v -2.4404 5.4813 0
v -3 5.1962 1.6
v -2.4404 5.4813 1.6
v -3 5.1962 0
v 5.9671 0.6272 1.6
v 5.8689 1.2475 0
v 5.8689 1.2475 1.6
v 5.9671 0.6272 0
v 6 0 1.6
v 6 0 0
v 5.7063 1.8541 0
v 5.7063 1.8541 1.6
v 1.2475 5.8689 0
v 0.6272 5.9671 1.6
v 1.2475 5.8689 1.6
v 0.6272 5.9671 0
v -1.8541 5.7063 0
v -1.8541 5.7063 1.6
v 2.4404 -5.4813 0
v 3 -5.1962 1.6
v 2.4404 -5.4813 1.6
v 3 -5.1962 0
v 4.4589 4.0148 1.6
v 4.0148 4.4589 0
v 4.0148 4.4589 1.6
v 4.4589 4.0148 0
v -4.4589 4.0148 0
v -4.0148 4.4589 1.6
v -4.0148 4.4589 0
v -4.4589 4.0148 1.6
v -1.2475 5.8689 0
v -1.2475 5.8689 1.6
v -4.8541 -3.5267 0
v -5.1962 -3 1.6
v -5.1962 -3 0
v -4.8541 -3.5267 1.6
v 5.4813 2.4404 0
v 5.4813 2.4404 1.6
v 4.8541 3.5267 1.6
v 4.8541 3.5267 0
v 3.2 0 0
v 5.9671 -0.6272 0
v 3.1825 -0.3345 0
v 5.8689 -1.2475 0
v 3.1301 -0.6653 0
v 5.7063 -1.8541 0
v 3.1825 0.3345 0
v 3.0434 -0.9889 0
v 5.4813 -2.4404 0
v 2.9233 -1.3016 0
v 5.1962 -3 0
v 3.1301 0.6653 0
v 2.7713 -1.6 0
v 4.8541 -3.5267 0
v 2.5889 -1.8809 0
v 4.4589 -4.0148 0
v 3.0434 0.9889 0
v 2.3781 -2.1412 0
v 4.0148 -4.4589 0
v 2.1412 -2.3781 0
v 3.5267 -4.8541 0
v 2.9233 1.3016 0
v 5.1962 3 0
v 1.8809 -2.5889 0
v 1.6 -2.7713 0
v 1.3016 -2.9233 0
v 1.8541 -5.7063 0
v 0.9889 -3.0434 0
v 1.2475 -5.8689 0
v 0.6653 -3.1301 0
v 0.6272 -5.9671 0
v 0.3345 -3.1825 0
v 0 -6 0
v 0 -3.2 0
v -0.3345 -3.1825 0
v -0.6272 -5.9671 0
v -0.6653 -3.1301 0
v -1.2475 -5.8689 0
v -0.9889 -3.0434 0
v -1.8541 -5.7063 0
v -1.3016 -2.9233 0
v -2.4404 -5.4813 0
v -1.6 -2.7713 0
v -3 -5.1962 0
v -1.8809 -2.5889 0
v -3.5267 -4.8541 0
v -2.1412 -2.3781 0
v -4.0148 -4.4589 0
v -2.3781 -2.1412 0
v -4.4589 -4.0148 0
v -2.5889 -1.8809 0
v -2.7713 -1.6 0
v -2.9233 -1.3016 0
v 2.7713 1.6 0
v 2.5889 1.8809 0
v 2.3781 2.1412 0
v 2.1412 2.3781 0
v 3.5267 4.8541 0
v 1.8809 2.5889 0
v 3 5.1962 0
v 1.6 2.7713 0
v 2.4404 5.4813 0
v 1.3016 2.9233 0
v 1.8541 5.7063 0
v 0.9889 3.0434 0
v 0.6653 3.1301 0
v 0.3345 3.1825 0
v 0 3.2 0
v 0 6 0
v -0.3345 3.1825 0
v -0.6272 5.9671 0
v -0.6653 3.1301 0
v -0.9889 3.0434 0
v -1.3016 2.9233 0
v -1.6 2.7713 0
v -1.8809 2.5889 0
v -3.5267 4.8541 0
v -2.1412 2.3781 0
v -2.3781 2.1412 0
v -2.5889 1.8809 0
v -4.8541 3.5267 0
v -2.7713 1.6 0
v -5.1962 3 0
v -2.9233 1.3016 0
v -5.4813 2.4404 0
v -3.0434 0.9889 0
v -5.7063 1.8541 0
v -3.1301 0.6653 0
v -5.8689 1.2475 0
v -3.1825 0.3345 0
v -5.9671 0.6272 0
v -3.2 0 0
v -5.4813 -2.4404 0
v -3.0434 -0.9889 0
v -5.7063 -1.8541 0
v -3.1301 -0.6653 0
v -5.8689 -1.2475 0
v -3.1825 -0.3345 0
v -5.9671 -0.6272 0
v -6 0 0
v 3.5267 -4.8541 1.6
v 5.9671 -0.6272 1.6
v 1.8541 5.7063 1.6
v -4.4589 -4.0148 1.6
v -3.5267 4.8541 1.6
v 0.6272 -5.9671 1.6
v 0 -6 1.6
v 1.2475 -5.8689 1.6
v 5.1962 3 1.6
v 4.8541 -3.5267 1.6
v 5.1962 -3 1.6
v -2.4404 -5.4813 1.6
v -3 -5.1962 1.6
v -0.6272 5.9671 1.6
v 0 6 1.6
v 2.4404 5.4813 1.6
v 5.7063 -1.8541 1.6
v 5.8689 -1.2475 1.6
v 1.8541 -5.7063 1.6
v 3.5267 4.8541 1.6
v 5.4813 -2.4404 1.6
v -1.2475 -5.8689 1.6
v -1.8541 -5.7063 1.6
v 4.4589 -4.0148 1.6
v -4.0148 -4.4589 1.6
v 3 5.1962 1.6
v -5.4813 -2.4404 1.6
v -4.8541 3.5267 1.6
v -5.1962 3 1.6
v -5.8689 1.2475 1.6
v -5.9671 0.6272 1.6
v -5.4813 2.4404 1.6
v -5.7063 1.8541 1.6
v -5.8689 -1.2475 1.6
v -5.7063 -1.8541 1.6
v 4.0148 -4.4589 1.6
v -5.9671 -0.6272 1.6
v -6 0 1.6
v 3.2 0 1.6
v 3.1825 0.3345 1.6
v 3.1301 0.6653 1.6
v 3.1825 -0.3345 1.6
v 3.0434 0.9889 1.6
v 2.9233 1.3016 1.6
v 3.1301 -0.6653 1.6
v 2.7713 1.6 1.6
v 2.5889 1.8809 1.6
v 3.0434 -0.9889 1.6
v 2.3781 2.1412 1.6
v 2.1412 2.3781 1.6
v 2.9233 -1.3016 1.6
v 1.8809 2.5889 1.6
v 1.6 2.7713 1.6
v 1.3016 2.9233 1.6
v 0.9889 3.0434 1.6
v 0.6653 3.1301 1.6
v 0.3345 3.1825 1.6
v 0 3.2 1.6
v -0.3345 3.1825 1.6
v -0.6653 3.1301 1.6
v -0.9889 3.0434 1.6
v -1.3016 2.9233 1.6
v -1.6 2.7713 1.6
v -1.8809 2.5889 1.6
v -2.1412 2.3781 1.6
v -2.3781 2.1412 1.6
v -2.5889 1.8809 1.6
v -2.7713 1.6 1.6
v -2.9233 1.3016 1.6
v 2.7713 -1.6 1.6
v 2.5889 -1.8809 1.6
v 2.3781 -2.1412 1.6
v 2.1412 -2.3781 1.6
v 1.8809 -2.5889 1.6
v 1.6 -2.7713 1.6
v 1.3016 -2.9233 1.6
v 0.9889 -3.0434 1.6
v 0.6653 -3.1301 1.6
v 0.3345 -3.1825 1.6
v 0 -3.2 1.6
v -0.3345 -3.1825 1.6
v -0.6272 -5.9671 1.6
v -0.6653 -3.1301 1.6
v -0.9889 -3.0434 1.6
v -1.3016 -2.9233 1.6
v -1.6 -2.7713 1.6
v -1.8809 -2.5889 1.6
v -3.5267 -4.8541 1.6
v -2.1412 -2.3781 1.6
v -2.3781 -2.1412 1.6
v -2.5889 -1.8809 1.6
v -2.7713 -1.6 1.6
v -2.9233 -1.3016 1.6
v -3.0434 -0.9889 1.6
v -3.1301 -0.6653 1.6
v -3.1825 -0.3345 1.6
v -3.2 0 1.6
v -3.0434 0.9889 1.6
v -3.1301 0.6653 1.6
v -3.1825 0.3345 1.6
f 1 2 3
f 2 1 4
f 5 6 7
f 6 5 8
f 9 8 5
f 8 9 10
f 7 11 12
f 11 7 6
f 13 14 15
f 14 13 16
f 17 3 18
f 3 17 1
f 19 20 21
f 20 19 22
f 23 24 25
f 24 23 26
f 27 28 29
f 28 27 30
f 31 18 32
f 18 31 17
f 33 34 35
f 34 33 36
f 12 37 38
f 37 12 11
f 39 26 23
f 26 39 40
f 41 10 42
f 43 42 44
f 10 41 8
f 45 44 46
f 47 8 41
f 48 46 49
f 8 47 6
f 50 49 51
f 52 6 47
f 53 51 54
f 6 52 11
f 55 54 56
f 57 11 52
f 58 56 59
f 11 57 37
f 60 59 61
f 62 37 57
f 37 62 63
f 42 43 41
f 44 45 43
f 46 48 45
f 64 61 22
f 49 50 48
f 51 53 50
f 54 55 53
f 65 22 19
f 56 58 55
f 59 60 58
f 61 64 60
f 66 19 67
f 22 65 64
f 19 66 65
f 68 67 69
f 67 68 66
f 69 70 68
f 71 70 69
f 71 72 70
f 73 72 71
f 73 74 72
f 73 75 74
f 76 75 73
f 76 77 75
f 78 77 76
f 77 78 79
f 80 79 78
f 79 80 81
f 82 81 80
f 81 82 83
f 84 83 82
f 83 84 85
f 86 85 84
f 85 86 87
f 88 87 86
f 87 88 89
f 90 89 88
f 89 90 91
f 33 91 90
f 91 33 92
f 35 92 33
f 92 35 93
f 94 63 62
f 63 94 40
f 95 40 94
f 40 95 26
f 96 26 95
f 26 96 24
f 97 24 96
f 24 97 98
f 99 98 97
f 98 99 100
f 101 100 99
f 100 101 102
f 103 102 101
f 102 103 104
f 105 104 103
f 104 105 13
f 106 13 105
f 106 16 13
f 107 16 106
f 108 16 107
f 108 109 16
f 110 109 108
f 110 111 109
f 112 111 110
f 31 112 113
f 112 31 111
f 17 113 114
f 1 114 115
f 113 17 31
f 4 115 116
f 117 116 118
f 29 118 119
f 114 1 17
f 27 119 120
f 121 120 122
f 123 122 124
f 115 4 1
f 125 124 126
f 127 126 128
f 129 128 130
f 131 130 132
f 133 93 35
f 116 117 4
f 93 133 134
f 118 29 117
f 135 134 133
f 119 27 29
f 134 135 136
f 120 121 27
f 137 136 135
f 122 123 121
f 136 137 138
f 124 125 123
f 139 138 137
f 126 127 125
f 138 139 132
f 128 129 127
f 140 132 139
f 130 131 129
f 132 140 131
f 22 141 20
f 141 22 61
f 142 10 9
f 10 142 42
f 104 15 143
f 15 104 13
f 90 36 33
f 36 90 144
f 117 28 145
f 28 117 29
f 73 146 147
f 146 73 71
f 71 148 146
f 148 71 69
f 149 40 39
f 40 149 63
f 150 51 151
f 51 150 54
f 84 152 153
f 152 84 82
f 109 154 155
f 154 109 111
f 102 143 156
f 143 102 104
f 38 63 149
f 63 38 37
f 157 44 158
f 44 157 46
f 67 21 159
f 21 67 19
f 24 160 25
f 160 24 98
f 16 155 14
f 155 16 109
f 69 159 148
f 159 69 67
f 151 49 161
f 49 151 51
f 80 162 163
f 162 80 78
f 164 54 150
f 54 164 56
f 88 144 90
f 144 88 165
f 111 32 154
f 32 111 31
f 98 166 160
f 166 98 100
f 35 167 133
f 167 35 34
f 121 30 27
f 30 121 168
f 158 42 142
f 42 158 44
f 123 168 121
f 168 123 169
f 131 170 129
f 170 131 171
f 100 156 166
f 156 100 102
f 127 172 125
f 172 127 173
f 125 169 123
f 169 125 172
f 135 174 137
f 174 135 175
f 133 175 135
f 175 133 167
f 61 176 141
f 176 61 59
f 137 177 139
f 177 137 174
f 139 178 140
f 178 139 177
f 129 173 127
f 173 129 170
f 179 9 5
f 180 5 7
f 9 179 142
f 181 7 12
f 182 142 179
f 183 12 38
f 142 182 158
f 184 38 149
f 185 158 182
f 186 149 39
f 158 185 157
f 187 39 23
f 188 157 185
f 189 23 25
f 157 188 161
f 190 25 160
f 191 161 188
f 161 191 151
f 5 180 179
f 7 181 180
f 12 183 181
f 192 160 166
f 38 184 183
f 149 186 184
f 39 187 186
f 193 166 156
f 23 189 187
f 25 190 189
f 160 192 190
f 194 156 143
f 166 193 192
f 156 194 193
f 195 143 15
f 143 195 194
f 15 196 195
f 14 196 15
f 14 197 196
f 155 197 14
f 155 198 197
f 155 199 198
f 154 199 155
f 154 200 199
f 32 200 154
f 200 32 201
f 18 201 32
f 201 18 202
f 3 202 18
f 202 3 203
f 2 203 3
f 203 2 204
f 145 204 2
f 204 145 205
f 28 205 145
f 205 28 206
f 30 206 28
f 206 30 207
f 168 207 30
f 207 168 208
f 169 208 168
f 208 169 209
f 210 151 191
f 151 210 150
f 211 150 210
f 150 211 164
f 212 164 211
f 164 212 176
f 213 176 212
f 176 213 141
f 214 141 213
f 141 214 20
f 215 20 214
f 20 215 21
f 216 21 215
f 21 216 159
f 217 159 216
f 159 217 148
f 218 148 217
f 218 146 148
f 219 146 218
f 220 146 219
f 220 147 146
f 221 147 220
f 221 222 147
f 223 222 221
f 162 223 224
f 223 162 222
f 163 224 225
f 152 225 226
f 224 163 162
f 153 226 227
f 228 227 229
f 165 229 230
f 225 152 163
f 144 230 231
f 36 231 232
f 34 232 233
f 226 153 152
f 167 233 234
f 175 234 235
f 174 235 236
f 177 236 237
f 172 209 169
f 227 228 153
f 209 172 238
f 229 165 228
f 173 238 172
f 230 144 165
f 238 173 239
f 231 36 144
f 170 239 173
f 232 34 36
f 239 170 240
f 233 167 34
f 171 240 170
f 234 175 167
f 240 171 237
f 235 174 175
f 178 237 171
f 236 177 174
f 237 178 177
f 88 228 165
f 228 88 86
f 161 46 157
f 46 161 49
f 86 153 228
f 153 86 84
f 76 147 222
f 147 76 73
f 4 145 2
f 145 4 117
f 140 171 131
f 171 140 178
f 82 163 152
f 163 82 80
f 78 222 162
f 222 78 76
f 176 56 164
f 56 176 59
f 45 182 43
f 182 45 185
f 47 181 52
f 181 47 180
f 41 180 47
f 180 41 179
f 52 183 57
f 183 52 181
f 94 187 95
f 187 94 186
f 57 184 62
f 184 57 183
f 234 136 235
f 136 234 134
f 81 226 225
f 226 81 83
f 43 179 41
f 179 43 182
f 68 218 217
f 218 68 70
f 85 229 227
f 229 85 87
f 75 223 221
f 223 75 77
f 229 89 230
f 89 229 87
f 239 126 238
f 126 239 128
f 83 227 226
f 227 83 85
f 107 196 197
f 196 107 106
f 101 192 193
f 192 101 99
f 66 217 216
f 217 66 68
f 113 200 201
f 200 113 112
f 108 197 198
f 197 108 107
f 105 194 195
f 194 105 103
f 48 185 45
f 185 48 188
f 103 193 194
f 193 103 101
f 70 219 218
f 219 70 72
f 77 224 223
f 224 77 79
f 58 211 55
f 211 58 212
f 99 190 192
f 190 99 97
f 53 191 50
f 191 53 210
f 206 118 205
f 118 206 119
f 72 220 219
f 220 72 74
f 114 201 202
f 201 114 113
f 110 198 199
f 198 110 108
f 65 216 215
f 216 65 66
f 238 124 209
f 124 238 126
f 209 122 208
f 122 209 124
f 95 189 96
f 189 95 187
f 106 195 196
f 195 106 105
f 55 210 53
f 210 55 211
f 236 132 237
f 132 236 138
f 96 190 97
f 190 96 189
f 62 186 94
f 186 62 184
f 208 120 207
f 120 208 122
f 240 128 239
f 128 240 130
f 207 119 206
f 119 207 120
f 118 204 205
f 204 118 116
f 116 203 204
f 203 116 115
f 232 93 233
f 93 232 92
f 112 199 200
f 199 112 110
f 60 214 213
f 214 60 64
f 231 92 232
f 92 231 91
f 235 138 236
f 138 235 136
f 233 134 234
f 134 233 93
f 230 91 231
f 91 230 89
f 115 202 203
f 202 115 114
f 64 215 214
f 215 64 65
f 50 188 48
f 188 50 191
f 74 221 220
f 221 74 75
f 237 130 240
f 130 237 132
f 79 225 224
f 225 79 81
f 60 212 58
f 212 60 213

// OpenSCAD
// Flat metric washer.
$fn = 60;
eps = 0.02;
inner_d = 6.4;
outer_d = 12;
thickness = 1.6;
difference() {
    cylinder(d = outer_d, h = thickness);
    translate([0, 0, -eps]) cylinder(d = inner_d, h = thickness + 2 * eps);
}
